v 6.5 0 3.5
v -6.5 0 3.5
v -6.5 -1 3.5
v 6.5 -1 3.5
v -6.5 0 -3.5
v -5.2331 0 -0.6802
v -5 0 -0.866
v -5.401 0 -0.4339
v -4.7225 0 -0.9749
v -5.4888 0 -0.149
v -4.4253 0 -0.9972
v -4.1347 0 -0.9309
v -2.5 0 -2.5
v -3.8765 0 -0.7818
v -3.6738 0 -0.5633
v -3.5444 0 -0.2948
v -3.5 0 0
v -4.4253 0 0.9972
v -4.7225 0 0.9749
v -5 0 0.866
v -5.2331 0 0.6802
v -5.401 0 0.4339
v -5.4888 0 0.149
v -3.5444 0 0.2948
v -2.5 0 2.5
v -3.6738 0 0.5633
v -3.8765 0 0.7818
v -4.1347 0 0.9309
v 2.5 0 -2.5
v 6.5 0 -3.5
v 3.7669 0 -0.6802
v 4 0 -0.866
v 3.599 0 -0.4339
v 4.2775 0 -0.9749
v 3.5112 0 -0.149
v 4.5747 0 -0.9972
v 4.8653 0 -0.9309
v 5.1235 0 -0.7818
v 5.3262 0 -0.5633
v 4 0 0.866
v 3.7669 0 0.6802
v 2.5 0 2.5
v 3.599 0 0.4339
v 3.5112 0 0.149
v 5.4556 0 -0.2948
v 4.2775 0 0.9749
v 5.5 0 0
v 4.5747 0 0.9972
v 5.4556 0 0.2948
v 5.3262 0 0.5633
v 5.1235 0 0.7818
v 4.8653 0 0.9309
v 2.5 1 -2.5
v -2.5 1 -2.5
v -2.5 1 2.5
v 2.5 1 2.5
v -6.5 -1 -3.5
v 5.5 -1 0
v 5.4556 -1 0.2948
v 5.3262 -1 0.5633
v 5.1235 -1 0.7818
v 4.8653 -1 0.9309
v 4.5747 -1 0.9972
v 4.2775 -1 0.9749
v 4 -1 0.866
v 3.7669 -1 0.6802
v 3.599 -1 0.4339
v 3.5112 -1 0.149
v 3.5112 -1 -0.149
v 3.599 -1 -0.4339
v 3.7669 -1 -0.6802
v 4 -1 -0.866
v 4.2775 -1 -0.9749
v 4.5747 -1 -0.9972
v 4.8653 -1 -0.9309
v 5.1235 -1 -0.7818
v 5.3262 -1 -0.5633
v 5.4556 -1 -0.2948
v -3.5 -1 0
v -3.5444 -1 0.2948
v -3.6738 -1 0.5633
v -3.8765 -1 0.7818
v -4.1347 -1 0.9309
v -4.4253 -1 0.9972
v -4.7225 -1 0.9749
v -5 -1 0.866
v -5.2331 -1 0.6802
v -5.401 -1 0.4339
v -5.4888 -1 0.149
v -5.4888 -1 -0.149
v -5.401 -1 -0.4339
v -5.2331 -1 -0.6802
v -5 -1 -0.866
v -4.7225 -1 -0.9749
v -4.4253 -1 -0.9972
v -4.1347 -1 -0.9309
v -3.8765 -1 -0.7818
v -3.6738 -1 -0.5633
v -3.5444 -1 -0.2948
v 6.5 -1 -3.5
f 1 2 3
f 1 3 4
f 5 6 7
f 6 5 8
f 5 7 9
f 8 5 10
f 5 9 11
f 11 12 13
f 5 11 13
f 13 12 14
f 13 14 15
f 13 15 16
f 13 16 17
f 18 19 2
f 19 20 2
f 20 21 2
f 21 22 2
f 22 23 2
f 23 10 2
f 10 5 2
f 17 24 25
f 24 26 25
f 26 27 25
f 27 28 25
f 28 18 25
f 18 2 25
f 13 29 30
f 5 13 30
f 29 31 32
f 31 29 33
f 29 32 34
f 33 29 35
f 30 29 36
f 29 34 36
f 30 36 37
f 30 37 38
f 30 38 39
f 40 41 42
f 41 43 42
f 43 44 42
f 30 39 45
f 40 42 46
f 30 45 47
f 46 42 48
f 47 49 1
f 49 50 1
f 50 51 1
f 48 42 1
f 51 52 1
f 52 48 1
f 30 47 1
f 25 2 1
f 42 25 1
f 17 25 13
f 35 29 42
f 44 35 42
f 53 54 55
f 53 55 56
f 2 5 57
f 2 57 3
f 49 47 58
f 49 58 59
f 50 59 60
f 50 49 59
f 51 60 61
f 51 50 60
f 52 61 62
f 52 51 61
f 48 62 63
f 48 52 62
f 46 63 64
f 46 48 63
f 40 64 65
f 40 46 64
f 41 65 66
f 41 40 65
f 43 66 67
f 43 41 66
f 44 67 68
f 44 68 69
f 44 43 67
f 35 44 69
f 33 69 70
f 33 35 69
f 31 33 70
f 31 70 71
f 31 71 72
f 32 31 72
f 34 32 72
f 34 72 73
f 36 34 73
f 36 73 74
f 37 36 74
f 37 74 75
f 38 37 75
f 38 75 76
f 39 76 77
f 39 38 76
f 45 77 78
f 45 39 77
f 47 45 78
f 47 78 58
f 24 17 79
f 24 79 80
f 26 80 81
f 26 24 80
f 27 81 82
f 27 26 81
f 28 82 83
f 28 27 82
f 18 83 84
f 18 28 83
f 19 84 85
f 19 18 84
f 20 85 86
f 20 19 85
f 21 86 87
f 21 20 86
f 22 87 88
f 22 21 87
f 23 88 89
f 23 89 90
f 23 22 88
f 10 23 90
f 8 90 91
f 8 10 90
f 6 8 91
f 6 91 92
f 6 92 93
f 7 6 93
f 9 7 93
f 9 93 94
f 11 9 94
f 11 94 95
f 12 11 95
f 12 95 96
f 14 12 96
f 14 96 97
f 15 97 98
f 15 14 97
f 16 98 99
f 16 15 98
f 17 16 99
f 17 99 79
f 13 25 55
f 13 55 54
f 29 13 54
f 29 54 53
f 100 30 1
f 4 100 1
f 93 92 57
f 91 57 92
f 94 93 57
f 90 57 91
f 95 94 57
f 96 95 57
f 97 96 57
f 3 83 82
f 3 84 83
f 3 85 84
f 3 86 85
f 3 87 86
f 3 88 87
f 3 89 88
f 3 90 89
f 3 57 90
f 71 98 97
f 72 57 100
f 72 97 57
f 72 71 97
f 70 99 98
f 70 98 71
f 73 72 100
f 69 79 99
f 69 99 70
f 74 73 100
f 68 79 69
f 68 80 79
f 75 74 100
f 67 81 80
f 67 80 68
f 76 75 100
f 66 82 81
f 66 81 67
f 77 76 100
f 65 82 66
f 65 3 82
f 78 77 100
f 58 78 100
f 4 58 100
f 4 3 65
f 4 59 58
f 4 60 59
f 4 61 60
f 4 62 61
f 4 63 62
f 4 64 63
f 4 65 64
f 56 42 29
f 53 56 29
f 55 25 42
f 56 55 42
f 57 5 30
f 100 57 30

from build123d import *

# Parameters (mm, degrees)
ESQUISSE1_W        = 5
ESQUISSE1_H        = 5
BOSS_EXTRU_1_DEPTH = 1
ESQUISSE2_W        = 13
ESQUISSE2_H        = 7
ESQUISSE2_R        = 1
BOSS_EXTRU_2_DEPTH = 1


with BuildPart() as part:
    # Esquisse1 → Boss.-Extru.1 (new body)
    with BuildSketch(Plane(origin=(0, 0, 0), x_dir=(1, 0, 0), z_dir=(0, 1, 0))):
        Rectangle(ESQUISSE1_W, ESQUISSE1_H)
    extrude(amount=BOSS_EXTRU_1_DEPTH)

    # Esquisse2 → Boss.-Extru.2 (add)
    with BuildSketch(Plane.XZ):
        Rectangle(ESQUISSE2_W, ESQUISSE2_H)
        with Locations((4.5, 0)):
            Circle(ESQUISSE2_R, mode=Mode.SUBTRACT)
        with Locations((-4.5, 0)):
            Circle(ESQUISSE2_R, mode=Mode.SUBTRACT)
    extrude(amount=BOSS_EXTRU_2_DEPTH)


solid = part.part
